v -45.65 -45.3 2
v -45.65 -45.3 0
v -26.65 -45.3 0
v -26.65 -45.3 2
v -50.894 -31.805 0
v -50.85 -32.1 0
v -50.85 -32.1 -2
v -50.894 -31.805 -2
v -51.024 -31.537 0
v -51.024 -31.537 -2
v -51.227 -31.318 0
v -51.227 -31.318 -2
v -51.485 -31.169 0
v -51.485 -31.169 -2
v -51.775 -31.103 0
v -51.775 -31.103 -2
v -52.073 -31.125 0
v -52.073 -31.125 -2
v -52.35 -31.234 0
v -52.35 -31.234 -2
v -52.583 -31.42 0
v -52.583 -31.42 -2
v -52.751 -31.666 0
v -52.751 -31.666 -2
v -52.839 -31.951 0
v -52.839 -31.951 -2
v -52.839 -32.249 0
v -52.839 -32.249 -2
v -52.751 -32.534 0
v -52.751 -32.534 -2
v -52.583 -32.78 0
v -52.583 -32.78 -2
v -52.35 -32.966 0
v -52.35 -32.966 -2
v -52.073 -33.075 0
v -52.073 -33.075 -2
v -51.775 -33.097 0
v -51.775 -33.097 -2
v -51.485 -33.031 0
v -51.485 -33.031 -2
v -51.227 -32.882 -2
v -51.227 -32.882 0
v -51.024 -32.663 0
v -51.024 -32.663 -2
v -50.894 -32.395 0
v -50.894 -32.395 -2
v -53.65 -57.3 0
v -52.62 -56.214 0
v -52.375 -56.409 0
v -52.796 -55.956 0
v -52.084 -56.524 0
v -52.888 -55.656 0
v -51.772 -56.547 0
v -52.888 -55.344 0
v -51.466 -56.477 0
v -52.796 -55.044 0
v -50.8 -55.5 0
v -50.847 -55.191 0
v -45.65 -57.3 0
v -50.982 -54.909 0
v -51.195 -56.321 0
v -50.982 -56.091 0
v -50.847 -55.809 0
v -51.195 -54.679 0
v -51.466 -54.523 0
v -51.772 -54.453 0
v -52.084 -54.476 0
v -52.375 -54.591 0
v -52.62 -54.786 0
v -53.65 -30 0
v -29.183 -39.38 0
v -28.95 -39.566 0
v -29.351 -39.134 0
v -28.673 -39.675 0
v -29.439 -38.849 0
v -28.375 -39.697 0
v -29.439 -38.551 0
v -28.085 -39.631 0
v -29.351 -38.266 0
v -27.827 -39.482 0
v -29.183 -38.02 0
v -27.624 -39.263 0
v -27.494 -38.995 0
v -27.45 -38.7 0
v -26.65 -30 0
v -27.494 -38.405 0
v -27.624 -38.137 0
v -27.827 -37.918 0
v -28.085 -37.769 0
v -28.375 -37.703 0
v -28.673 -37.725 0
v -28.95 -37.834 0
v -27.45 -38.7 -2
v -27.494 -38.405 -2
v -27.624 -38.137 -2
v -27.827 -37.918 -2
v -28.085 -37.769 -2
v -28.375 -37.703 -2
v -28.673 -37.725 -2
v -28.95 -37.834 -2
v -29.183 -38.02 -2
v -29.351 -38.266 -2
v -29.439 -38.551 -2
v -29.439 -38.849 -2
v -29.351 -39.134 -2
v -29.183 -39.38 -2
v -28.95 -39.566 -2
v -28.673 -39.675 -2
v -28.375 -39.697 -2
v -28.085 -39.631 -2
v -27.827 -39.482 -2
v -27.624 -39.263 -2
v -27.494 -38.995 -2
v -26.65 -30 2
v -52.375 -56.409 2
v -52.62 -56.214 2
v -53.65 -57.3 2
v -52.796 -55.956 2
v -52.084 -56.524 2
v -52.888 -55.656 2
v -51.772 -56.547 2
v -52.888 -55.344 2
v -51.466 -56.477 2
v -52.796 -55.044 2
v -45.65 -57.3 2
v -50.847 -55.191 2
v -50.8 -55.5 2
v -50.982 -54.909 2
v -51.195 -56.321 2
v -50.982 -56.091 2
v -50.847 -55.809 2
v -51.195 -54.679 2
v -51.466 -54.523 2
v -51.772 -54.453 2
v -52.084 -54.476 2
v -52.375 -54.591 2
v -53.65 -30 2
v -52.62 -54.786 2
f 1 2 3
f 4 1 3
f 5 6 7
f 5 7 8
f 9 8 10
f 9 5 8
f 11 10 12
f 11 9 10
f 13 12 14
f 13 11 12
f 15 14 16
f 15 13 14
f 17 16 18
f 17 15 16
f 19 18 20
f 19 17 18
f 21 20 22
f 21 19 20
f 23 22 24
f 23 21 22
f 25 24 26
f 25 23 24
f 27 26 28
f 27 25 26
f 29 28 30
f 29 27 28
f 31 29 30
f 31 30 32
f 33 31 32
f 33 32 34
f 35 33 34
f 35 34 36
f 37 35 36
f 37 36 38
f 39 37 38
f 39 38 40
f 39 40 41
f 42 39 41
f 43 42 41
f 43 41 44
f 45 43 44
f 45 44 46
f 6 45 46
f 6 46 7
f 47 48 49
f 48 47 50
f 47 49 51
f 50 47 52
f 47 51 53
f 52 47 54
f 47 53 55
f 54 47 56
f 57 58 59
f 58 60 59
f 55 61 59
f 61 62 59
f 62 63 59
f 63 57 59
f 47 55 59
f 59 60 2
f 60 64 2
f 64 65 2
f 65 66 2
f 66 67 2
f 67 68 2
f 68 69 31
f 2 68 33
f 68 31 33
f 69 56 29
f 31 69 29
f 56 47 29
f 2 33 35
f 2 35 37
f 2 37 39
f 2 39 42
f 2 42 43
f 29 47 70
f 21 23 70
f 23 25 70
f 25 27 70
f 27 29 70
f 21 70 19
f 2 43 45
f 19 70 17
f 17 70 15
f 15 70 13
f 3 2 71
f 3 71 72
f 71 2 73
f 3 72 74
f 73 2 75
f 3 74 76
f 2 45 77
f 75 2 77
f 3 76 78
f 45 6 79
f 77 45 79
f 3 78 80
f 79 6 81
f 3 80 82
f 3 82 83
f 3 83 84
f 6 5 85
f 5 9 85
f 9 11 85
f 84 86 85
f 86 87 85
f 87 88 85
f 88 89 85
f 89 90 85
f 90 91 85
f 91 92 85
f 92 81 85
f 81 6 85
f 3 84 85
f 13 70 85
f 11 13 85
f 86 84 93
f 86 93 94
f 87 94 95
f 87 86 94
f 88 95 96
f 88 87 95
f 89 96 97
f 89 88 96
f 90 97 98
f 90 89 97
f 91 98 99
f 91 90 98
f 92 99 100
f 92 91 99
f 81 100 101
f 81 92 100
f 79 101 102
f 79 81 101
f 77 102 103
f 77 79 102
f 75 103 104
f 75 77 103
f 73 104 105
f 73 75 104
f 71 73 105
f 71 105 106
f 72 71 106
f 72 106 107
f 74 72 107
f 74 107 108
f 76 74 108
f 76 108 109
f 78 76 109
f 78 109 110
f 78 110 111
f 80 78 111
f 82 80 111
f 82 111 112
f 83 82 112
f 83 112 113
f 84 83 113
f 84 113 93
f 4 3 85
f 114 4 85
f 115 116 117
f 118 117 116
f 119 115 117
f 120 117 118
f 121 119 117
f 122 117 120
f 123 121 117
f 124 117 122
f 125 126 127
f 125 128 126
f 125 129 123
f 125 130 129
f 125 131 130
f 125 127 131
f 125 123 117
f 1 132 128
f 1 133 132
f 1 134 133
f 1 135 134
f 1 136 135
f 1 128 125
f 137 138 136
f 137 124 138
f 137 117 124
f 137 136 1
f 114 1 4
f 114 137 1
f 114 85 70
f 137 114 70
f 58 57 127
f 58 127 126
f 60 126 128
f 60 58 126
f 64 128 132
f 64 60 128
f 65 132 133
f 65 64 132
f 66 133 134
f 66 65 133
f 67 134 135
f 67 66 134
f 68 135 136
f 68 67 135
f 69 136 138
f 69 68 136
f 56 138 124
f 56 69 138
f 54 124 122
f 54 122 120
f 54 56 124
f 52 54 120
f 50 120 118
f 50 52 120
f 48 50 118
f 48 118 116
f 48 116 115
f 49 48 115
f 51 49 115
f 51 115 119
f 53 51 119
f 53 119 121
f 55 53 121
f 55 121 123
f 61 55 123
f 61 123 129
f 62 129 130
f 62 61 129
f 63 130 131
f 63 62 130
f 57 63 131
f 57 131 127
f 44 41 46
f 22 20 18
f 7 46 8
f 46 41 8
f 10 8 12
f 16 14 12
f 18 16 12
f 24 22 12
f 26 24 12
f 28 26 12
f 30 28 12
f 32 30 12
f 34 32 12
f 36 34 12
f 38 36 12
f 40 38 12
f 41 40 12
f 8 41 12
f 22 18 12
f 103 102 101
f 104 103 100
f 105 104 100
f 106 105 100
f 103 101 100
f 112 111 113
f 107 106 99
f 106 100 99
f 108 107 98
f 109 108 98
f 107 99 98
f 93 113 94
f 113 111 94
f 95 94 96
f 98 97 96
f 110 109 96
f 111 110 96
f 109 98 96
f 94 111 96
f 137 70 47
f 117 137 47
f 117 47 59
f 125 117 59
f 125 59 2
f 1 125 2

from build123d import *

# Parameters (mm, degrees)
SKETCH1_R           = 1.05
BOSS_EXTRUDE1_DEPTH = 2
SKETCH2_R           = 1
BOSS_EXTRUDE2_DEPTH = 4


with BuildPart() as part:
    # Sketch1 → Boss-Extrude1 (new body)
    with BuildSketch(Plane.XY):
        Polygon((-53.65, -57.3), (-45.65, -57.3), (-45.65, -45.3), (-26.65, -45.3), (-26.65, -30), (-53.65, -30), align=None)
        with Locations((-51.85, -55.5)):
            Circle(SKETCH1_R, mode=Mode.SUBTRACT)
    extrude(amount=BOSS_EXTRUDE1_DEPTH)

    # Sketch2 → Boss-Extrude2 (add)
    with BuildSketch(Plane.XY.offset(2)):
        with Locations((-28.45, -38.7)):
            Circle(SKETCH2_R)
        with Locations((-51.85, -32.1)):
            Circle(SKETCH2_R)
    extrude(amount=-BOSS_EXTRUDE2_DEPTH)


solid = part.part
